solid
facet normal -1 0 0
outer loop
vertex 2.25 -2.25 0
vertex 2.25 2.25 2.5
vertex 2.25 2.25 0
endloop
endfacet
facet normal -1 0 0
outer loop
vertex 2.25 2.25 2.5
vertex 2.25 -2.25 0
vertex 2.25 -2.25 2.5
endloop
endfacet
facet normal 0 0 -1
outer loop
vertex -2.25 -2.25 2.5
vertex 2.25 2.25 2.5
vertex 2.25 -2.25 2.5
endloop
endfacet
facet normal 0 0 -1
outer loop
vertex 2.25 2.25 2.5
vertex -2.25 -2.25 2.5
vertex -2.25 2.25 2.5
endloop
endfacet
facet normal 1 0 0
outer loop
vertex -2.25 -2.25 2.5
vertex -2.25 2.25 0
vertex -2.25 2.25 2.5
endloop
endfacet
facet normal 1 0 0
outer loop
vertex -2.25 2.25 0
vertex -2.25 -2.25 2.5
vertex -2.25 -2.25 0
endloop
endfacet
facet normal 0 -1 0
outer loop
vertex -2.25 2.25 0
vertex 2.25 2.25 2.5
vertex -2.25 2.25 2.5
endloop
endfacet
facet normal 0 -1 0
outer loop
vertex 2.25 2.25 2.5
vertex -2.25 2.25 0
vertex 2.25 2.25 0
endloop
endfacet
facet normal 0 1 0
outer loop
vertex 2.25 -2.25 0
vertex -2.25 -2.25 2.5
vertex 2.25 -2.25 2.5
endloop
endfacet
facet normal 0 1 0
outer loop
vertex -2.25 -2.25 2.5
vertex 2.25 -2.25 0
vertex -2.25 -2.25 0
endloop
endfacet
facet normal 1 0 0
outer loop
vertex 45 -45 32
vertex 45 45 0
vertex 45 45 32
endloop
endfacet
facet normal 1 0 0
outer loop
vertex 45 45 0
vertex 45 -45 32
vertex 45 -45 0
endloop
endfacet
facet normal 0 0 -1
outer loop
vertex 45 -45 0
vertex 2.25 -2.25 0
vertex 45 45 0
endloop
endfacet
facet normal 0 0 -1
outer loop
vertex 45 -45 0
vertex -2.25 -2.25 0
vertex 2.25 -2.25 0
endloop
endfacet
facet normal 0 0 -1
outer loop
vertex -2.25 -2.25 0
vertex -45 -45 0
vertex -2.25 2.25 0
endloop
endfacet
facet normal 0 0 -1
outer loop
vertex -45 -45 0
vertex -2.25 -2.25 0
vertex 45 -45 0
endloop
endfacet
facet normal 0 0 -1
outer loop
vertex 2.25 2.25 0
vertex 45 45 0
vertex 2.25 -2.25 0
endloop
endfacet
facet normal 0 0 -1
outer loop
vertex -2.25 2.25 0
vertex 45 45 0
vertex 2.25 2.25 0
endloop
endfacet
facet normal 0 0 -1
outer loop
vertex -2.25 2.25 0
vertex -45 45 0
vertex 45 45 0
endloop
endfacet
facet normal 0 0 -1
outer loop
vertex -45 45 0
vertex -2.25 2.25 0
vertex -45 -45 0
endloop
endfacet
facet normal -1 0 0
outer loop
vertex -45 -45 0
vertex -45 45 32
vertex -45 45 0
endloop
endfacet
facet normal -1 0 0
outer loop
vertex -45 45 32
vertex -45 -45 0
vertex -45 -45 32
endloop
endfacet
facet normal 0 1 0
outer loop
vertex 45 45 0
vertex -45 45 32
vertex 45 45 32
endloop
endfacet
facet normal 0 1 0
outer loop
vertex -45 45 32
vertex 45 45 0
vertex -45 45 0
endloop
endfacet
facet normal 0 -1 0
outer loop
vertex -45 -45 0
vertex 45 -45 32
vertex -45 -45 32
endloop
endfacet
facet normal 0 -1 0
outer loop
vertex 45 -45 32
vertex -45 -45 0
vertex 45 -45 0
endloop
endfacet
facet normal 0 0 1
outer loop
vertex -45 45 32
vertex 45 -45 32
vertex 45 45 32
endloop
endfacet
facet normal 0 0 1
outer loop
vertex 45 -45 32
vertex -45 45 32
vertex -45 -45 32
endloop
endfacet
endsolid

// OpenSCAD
// DIY magnetic stirrer housing - printed upside down (open box)
// Units: mm

// ---------- Parameters ----------
box_outer_x     = 90;    // outer size in X
box_outer_y     = 90;    // outer size in Y
plate_thickness = 2;     // top plate thickness (z = 0 to 2)
wall_thickness  = 2.5;   // wall thickness
box_height      = 40;    // total height of box (open at z = 37.5 to 40)
hole_d          = 4.5;   // M4 screw hole diameter
hole_count      = 4;     // number of screw holes
hole_pitch      = 71.5;  // square pattern side length for holes
notch_width     = 12;    // cable notch width
notch_depth     = 8;     // cable notch depth from open edge (z = 32 to 40)
eps             = 0.5;   // cutter overshoot past faces

$fn = 64;

// ---------- Model ----------
difference() {
    // Solid block of the housing
    translate([-box_outer_x/2, -box_outer_y/2, 0])
        cube([box_outer_x, box_outer_y, box_height]);

    // Open top (from z = box_height - notch_depth to box_height)
    translate([-box_outer_x/2 - eps, -box_outer_y/2 - eps, box_height - notch_depth])
        cube([box_outer_x + 2*eps, box_outer_y + 2*eps, notch_depth + eps]);

    // Screw holes through the top plate, centred on the plate
    for (i = [0 : hole_count - 1]) {
        a = (i % hole_count) * hole_pitch;   // x position
        b = (i / hole_count) * hole_pitch;   // y position
        translate([a - hole_d/2, b - hole_d/2, -eps])
            cube([hole_d, hole_d, plate_thickness + 2*eps]);
    }

    // Cable notch in one wall (along Y, centred)
    translate([-box_outer_x/2 - eps, -box_outer_y/2 - eps/2, box_height - notch_depth])
        cube([box_outer_x + 2*eps, notch_width + eps, notch_depth + eps]);
}
